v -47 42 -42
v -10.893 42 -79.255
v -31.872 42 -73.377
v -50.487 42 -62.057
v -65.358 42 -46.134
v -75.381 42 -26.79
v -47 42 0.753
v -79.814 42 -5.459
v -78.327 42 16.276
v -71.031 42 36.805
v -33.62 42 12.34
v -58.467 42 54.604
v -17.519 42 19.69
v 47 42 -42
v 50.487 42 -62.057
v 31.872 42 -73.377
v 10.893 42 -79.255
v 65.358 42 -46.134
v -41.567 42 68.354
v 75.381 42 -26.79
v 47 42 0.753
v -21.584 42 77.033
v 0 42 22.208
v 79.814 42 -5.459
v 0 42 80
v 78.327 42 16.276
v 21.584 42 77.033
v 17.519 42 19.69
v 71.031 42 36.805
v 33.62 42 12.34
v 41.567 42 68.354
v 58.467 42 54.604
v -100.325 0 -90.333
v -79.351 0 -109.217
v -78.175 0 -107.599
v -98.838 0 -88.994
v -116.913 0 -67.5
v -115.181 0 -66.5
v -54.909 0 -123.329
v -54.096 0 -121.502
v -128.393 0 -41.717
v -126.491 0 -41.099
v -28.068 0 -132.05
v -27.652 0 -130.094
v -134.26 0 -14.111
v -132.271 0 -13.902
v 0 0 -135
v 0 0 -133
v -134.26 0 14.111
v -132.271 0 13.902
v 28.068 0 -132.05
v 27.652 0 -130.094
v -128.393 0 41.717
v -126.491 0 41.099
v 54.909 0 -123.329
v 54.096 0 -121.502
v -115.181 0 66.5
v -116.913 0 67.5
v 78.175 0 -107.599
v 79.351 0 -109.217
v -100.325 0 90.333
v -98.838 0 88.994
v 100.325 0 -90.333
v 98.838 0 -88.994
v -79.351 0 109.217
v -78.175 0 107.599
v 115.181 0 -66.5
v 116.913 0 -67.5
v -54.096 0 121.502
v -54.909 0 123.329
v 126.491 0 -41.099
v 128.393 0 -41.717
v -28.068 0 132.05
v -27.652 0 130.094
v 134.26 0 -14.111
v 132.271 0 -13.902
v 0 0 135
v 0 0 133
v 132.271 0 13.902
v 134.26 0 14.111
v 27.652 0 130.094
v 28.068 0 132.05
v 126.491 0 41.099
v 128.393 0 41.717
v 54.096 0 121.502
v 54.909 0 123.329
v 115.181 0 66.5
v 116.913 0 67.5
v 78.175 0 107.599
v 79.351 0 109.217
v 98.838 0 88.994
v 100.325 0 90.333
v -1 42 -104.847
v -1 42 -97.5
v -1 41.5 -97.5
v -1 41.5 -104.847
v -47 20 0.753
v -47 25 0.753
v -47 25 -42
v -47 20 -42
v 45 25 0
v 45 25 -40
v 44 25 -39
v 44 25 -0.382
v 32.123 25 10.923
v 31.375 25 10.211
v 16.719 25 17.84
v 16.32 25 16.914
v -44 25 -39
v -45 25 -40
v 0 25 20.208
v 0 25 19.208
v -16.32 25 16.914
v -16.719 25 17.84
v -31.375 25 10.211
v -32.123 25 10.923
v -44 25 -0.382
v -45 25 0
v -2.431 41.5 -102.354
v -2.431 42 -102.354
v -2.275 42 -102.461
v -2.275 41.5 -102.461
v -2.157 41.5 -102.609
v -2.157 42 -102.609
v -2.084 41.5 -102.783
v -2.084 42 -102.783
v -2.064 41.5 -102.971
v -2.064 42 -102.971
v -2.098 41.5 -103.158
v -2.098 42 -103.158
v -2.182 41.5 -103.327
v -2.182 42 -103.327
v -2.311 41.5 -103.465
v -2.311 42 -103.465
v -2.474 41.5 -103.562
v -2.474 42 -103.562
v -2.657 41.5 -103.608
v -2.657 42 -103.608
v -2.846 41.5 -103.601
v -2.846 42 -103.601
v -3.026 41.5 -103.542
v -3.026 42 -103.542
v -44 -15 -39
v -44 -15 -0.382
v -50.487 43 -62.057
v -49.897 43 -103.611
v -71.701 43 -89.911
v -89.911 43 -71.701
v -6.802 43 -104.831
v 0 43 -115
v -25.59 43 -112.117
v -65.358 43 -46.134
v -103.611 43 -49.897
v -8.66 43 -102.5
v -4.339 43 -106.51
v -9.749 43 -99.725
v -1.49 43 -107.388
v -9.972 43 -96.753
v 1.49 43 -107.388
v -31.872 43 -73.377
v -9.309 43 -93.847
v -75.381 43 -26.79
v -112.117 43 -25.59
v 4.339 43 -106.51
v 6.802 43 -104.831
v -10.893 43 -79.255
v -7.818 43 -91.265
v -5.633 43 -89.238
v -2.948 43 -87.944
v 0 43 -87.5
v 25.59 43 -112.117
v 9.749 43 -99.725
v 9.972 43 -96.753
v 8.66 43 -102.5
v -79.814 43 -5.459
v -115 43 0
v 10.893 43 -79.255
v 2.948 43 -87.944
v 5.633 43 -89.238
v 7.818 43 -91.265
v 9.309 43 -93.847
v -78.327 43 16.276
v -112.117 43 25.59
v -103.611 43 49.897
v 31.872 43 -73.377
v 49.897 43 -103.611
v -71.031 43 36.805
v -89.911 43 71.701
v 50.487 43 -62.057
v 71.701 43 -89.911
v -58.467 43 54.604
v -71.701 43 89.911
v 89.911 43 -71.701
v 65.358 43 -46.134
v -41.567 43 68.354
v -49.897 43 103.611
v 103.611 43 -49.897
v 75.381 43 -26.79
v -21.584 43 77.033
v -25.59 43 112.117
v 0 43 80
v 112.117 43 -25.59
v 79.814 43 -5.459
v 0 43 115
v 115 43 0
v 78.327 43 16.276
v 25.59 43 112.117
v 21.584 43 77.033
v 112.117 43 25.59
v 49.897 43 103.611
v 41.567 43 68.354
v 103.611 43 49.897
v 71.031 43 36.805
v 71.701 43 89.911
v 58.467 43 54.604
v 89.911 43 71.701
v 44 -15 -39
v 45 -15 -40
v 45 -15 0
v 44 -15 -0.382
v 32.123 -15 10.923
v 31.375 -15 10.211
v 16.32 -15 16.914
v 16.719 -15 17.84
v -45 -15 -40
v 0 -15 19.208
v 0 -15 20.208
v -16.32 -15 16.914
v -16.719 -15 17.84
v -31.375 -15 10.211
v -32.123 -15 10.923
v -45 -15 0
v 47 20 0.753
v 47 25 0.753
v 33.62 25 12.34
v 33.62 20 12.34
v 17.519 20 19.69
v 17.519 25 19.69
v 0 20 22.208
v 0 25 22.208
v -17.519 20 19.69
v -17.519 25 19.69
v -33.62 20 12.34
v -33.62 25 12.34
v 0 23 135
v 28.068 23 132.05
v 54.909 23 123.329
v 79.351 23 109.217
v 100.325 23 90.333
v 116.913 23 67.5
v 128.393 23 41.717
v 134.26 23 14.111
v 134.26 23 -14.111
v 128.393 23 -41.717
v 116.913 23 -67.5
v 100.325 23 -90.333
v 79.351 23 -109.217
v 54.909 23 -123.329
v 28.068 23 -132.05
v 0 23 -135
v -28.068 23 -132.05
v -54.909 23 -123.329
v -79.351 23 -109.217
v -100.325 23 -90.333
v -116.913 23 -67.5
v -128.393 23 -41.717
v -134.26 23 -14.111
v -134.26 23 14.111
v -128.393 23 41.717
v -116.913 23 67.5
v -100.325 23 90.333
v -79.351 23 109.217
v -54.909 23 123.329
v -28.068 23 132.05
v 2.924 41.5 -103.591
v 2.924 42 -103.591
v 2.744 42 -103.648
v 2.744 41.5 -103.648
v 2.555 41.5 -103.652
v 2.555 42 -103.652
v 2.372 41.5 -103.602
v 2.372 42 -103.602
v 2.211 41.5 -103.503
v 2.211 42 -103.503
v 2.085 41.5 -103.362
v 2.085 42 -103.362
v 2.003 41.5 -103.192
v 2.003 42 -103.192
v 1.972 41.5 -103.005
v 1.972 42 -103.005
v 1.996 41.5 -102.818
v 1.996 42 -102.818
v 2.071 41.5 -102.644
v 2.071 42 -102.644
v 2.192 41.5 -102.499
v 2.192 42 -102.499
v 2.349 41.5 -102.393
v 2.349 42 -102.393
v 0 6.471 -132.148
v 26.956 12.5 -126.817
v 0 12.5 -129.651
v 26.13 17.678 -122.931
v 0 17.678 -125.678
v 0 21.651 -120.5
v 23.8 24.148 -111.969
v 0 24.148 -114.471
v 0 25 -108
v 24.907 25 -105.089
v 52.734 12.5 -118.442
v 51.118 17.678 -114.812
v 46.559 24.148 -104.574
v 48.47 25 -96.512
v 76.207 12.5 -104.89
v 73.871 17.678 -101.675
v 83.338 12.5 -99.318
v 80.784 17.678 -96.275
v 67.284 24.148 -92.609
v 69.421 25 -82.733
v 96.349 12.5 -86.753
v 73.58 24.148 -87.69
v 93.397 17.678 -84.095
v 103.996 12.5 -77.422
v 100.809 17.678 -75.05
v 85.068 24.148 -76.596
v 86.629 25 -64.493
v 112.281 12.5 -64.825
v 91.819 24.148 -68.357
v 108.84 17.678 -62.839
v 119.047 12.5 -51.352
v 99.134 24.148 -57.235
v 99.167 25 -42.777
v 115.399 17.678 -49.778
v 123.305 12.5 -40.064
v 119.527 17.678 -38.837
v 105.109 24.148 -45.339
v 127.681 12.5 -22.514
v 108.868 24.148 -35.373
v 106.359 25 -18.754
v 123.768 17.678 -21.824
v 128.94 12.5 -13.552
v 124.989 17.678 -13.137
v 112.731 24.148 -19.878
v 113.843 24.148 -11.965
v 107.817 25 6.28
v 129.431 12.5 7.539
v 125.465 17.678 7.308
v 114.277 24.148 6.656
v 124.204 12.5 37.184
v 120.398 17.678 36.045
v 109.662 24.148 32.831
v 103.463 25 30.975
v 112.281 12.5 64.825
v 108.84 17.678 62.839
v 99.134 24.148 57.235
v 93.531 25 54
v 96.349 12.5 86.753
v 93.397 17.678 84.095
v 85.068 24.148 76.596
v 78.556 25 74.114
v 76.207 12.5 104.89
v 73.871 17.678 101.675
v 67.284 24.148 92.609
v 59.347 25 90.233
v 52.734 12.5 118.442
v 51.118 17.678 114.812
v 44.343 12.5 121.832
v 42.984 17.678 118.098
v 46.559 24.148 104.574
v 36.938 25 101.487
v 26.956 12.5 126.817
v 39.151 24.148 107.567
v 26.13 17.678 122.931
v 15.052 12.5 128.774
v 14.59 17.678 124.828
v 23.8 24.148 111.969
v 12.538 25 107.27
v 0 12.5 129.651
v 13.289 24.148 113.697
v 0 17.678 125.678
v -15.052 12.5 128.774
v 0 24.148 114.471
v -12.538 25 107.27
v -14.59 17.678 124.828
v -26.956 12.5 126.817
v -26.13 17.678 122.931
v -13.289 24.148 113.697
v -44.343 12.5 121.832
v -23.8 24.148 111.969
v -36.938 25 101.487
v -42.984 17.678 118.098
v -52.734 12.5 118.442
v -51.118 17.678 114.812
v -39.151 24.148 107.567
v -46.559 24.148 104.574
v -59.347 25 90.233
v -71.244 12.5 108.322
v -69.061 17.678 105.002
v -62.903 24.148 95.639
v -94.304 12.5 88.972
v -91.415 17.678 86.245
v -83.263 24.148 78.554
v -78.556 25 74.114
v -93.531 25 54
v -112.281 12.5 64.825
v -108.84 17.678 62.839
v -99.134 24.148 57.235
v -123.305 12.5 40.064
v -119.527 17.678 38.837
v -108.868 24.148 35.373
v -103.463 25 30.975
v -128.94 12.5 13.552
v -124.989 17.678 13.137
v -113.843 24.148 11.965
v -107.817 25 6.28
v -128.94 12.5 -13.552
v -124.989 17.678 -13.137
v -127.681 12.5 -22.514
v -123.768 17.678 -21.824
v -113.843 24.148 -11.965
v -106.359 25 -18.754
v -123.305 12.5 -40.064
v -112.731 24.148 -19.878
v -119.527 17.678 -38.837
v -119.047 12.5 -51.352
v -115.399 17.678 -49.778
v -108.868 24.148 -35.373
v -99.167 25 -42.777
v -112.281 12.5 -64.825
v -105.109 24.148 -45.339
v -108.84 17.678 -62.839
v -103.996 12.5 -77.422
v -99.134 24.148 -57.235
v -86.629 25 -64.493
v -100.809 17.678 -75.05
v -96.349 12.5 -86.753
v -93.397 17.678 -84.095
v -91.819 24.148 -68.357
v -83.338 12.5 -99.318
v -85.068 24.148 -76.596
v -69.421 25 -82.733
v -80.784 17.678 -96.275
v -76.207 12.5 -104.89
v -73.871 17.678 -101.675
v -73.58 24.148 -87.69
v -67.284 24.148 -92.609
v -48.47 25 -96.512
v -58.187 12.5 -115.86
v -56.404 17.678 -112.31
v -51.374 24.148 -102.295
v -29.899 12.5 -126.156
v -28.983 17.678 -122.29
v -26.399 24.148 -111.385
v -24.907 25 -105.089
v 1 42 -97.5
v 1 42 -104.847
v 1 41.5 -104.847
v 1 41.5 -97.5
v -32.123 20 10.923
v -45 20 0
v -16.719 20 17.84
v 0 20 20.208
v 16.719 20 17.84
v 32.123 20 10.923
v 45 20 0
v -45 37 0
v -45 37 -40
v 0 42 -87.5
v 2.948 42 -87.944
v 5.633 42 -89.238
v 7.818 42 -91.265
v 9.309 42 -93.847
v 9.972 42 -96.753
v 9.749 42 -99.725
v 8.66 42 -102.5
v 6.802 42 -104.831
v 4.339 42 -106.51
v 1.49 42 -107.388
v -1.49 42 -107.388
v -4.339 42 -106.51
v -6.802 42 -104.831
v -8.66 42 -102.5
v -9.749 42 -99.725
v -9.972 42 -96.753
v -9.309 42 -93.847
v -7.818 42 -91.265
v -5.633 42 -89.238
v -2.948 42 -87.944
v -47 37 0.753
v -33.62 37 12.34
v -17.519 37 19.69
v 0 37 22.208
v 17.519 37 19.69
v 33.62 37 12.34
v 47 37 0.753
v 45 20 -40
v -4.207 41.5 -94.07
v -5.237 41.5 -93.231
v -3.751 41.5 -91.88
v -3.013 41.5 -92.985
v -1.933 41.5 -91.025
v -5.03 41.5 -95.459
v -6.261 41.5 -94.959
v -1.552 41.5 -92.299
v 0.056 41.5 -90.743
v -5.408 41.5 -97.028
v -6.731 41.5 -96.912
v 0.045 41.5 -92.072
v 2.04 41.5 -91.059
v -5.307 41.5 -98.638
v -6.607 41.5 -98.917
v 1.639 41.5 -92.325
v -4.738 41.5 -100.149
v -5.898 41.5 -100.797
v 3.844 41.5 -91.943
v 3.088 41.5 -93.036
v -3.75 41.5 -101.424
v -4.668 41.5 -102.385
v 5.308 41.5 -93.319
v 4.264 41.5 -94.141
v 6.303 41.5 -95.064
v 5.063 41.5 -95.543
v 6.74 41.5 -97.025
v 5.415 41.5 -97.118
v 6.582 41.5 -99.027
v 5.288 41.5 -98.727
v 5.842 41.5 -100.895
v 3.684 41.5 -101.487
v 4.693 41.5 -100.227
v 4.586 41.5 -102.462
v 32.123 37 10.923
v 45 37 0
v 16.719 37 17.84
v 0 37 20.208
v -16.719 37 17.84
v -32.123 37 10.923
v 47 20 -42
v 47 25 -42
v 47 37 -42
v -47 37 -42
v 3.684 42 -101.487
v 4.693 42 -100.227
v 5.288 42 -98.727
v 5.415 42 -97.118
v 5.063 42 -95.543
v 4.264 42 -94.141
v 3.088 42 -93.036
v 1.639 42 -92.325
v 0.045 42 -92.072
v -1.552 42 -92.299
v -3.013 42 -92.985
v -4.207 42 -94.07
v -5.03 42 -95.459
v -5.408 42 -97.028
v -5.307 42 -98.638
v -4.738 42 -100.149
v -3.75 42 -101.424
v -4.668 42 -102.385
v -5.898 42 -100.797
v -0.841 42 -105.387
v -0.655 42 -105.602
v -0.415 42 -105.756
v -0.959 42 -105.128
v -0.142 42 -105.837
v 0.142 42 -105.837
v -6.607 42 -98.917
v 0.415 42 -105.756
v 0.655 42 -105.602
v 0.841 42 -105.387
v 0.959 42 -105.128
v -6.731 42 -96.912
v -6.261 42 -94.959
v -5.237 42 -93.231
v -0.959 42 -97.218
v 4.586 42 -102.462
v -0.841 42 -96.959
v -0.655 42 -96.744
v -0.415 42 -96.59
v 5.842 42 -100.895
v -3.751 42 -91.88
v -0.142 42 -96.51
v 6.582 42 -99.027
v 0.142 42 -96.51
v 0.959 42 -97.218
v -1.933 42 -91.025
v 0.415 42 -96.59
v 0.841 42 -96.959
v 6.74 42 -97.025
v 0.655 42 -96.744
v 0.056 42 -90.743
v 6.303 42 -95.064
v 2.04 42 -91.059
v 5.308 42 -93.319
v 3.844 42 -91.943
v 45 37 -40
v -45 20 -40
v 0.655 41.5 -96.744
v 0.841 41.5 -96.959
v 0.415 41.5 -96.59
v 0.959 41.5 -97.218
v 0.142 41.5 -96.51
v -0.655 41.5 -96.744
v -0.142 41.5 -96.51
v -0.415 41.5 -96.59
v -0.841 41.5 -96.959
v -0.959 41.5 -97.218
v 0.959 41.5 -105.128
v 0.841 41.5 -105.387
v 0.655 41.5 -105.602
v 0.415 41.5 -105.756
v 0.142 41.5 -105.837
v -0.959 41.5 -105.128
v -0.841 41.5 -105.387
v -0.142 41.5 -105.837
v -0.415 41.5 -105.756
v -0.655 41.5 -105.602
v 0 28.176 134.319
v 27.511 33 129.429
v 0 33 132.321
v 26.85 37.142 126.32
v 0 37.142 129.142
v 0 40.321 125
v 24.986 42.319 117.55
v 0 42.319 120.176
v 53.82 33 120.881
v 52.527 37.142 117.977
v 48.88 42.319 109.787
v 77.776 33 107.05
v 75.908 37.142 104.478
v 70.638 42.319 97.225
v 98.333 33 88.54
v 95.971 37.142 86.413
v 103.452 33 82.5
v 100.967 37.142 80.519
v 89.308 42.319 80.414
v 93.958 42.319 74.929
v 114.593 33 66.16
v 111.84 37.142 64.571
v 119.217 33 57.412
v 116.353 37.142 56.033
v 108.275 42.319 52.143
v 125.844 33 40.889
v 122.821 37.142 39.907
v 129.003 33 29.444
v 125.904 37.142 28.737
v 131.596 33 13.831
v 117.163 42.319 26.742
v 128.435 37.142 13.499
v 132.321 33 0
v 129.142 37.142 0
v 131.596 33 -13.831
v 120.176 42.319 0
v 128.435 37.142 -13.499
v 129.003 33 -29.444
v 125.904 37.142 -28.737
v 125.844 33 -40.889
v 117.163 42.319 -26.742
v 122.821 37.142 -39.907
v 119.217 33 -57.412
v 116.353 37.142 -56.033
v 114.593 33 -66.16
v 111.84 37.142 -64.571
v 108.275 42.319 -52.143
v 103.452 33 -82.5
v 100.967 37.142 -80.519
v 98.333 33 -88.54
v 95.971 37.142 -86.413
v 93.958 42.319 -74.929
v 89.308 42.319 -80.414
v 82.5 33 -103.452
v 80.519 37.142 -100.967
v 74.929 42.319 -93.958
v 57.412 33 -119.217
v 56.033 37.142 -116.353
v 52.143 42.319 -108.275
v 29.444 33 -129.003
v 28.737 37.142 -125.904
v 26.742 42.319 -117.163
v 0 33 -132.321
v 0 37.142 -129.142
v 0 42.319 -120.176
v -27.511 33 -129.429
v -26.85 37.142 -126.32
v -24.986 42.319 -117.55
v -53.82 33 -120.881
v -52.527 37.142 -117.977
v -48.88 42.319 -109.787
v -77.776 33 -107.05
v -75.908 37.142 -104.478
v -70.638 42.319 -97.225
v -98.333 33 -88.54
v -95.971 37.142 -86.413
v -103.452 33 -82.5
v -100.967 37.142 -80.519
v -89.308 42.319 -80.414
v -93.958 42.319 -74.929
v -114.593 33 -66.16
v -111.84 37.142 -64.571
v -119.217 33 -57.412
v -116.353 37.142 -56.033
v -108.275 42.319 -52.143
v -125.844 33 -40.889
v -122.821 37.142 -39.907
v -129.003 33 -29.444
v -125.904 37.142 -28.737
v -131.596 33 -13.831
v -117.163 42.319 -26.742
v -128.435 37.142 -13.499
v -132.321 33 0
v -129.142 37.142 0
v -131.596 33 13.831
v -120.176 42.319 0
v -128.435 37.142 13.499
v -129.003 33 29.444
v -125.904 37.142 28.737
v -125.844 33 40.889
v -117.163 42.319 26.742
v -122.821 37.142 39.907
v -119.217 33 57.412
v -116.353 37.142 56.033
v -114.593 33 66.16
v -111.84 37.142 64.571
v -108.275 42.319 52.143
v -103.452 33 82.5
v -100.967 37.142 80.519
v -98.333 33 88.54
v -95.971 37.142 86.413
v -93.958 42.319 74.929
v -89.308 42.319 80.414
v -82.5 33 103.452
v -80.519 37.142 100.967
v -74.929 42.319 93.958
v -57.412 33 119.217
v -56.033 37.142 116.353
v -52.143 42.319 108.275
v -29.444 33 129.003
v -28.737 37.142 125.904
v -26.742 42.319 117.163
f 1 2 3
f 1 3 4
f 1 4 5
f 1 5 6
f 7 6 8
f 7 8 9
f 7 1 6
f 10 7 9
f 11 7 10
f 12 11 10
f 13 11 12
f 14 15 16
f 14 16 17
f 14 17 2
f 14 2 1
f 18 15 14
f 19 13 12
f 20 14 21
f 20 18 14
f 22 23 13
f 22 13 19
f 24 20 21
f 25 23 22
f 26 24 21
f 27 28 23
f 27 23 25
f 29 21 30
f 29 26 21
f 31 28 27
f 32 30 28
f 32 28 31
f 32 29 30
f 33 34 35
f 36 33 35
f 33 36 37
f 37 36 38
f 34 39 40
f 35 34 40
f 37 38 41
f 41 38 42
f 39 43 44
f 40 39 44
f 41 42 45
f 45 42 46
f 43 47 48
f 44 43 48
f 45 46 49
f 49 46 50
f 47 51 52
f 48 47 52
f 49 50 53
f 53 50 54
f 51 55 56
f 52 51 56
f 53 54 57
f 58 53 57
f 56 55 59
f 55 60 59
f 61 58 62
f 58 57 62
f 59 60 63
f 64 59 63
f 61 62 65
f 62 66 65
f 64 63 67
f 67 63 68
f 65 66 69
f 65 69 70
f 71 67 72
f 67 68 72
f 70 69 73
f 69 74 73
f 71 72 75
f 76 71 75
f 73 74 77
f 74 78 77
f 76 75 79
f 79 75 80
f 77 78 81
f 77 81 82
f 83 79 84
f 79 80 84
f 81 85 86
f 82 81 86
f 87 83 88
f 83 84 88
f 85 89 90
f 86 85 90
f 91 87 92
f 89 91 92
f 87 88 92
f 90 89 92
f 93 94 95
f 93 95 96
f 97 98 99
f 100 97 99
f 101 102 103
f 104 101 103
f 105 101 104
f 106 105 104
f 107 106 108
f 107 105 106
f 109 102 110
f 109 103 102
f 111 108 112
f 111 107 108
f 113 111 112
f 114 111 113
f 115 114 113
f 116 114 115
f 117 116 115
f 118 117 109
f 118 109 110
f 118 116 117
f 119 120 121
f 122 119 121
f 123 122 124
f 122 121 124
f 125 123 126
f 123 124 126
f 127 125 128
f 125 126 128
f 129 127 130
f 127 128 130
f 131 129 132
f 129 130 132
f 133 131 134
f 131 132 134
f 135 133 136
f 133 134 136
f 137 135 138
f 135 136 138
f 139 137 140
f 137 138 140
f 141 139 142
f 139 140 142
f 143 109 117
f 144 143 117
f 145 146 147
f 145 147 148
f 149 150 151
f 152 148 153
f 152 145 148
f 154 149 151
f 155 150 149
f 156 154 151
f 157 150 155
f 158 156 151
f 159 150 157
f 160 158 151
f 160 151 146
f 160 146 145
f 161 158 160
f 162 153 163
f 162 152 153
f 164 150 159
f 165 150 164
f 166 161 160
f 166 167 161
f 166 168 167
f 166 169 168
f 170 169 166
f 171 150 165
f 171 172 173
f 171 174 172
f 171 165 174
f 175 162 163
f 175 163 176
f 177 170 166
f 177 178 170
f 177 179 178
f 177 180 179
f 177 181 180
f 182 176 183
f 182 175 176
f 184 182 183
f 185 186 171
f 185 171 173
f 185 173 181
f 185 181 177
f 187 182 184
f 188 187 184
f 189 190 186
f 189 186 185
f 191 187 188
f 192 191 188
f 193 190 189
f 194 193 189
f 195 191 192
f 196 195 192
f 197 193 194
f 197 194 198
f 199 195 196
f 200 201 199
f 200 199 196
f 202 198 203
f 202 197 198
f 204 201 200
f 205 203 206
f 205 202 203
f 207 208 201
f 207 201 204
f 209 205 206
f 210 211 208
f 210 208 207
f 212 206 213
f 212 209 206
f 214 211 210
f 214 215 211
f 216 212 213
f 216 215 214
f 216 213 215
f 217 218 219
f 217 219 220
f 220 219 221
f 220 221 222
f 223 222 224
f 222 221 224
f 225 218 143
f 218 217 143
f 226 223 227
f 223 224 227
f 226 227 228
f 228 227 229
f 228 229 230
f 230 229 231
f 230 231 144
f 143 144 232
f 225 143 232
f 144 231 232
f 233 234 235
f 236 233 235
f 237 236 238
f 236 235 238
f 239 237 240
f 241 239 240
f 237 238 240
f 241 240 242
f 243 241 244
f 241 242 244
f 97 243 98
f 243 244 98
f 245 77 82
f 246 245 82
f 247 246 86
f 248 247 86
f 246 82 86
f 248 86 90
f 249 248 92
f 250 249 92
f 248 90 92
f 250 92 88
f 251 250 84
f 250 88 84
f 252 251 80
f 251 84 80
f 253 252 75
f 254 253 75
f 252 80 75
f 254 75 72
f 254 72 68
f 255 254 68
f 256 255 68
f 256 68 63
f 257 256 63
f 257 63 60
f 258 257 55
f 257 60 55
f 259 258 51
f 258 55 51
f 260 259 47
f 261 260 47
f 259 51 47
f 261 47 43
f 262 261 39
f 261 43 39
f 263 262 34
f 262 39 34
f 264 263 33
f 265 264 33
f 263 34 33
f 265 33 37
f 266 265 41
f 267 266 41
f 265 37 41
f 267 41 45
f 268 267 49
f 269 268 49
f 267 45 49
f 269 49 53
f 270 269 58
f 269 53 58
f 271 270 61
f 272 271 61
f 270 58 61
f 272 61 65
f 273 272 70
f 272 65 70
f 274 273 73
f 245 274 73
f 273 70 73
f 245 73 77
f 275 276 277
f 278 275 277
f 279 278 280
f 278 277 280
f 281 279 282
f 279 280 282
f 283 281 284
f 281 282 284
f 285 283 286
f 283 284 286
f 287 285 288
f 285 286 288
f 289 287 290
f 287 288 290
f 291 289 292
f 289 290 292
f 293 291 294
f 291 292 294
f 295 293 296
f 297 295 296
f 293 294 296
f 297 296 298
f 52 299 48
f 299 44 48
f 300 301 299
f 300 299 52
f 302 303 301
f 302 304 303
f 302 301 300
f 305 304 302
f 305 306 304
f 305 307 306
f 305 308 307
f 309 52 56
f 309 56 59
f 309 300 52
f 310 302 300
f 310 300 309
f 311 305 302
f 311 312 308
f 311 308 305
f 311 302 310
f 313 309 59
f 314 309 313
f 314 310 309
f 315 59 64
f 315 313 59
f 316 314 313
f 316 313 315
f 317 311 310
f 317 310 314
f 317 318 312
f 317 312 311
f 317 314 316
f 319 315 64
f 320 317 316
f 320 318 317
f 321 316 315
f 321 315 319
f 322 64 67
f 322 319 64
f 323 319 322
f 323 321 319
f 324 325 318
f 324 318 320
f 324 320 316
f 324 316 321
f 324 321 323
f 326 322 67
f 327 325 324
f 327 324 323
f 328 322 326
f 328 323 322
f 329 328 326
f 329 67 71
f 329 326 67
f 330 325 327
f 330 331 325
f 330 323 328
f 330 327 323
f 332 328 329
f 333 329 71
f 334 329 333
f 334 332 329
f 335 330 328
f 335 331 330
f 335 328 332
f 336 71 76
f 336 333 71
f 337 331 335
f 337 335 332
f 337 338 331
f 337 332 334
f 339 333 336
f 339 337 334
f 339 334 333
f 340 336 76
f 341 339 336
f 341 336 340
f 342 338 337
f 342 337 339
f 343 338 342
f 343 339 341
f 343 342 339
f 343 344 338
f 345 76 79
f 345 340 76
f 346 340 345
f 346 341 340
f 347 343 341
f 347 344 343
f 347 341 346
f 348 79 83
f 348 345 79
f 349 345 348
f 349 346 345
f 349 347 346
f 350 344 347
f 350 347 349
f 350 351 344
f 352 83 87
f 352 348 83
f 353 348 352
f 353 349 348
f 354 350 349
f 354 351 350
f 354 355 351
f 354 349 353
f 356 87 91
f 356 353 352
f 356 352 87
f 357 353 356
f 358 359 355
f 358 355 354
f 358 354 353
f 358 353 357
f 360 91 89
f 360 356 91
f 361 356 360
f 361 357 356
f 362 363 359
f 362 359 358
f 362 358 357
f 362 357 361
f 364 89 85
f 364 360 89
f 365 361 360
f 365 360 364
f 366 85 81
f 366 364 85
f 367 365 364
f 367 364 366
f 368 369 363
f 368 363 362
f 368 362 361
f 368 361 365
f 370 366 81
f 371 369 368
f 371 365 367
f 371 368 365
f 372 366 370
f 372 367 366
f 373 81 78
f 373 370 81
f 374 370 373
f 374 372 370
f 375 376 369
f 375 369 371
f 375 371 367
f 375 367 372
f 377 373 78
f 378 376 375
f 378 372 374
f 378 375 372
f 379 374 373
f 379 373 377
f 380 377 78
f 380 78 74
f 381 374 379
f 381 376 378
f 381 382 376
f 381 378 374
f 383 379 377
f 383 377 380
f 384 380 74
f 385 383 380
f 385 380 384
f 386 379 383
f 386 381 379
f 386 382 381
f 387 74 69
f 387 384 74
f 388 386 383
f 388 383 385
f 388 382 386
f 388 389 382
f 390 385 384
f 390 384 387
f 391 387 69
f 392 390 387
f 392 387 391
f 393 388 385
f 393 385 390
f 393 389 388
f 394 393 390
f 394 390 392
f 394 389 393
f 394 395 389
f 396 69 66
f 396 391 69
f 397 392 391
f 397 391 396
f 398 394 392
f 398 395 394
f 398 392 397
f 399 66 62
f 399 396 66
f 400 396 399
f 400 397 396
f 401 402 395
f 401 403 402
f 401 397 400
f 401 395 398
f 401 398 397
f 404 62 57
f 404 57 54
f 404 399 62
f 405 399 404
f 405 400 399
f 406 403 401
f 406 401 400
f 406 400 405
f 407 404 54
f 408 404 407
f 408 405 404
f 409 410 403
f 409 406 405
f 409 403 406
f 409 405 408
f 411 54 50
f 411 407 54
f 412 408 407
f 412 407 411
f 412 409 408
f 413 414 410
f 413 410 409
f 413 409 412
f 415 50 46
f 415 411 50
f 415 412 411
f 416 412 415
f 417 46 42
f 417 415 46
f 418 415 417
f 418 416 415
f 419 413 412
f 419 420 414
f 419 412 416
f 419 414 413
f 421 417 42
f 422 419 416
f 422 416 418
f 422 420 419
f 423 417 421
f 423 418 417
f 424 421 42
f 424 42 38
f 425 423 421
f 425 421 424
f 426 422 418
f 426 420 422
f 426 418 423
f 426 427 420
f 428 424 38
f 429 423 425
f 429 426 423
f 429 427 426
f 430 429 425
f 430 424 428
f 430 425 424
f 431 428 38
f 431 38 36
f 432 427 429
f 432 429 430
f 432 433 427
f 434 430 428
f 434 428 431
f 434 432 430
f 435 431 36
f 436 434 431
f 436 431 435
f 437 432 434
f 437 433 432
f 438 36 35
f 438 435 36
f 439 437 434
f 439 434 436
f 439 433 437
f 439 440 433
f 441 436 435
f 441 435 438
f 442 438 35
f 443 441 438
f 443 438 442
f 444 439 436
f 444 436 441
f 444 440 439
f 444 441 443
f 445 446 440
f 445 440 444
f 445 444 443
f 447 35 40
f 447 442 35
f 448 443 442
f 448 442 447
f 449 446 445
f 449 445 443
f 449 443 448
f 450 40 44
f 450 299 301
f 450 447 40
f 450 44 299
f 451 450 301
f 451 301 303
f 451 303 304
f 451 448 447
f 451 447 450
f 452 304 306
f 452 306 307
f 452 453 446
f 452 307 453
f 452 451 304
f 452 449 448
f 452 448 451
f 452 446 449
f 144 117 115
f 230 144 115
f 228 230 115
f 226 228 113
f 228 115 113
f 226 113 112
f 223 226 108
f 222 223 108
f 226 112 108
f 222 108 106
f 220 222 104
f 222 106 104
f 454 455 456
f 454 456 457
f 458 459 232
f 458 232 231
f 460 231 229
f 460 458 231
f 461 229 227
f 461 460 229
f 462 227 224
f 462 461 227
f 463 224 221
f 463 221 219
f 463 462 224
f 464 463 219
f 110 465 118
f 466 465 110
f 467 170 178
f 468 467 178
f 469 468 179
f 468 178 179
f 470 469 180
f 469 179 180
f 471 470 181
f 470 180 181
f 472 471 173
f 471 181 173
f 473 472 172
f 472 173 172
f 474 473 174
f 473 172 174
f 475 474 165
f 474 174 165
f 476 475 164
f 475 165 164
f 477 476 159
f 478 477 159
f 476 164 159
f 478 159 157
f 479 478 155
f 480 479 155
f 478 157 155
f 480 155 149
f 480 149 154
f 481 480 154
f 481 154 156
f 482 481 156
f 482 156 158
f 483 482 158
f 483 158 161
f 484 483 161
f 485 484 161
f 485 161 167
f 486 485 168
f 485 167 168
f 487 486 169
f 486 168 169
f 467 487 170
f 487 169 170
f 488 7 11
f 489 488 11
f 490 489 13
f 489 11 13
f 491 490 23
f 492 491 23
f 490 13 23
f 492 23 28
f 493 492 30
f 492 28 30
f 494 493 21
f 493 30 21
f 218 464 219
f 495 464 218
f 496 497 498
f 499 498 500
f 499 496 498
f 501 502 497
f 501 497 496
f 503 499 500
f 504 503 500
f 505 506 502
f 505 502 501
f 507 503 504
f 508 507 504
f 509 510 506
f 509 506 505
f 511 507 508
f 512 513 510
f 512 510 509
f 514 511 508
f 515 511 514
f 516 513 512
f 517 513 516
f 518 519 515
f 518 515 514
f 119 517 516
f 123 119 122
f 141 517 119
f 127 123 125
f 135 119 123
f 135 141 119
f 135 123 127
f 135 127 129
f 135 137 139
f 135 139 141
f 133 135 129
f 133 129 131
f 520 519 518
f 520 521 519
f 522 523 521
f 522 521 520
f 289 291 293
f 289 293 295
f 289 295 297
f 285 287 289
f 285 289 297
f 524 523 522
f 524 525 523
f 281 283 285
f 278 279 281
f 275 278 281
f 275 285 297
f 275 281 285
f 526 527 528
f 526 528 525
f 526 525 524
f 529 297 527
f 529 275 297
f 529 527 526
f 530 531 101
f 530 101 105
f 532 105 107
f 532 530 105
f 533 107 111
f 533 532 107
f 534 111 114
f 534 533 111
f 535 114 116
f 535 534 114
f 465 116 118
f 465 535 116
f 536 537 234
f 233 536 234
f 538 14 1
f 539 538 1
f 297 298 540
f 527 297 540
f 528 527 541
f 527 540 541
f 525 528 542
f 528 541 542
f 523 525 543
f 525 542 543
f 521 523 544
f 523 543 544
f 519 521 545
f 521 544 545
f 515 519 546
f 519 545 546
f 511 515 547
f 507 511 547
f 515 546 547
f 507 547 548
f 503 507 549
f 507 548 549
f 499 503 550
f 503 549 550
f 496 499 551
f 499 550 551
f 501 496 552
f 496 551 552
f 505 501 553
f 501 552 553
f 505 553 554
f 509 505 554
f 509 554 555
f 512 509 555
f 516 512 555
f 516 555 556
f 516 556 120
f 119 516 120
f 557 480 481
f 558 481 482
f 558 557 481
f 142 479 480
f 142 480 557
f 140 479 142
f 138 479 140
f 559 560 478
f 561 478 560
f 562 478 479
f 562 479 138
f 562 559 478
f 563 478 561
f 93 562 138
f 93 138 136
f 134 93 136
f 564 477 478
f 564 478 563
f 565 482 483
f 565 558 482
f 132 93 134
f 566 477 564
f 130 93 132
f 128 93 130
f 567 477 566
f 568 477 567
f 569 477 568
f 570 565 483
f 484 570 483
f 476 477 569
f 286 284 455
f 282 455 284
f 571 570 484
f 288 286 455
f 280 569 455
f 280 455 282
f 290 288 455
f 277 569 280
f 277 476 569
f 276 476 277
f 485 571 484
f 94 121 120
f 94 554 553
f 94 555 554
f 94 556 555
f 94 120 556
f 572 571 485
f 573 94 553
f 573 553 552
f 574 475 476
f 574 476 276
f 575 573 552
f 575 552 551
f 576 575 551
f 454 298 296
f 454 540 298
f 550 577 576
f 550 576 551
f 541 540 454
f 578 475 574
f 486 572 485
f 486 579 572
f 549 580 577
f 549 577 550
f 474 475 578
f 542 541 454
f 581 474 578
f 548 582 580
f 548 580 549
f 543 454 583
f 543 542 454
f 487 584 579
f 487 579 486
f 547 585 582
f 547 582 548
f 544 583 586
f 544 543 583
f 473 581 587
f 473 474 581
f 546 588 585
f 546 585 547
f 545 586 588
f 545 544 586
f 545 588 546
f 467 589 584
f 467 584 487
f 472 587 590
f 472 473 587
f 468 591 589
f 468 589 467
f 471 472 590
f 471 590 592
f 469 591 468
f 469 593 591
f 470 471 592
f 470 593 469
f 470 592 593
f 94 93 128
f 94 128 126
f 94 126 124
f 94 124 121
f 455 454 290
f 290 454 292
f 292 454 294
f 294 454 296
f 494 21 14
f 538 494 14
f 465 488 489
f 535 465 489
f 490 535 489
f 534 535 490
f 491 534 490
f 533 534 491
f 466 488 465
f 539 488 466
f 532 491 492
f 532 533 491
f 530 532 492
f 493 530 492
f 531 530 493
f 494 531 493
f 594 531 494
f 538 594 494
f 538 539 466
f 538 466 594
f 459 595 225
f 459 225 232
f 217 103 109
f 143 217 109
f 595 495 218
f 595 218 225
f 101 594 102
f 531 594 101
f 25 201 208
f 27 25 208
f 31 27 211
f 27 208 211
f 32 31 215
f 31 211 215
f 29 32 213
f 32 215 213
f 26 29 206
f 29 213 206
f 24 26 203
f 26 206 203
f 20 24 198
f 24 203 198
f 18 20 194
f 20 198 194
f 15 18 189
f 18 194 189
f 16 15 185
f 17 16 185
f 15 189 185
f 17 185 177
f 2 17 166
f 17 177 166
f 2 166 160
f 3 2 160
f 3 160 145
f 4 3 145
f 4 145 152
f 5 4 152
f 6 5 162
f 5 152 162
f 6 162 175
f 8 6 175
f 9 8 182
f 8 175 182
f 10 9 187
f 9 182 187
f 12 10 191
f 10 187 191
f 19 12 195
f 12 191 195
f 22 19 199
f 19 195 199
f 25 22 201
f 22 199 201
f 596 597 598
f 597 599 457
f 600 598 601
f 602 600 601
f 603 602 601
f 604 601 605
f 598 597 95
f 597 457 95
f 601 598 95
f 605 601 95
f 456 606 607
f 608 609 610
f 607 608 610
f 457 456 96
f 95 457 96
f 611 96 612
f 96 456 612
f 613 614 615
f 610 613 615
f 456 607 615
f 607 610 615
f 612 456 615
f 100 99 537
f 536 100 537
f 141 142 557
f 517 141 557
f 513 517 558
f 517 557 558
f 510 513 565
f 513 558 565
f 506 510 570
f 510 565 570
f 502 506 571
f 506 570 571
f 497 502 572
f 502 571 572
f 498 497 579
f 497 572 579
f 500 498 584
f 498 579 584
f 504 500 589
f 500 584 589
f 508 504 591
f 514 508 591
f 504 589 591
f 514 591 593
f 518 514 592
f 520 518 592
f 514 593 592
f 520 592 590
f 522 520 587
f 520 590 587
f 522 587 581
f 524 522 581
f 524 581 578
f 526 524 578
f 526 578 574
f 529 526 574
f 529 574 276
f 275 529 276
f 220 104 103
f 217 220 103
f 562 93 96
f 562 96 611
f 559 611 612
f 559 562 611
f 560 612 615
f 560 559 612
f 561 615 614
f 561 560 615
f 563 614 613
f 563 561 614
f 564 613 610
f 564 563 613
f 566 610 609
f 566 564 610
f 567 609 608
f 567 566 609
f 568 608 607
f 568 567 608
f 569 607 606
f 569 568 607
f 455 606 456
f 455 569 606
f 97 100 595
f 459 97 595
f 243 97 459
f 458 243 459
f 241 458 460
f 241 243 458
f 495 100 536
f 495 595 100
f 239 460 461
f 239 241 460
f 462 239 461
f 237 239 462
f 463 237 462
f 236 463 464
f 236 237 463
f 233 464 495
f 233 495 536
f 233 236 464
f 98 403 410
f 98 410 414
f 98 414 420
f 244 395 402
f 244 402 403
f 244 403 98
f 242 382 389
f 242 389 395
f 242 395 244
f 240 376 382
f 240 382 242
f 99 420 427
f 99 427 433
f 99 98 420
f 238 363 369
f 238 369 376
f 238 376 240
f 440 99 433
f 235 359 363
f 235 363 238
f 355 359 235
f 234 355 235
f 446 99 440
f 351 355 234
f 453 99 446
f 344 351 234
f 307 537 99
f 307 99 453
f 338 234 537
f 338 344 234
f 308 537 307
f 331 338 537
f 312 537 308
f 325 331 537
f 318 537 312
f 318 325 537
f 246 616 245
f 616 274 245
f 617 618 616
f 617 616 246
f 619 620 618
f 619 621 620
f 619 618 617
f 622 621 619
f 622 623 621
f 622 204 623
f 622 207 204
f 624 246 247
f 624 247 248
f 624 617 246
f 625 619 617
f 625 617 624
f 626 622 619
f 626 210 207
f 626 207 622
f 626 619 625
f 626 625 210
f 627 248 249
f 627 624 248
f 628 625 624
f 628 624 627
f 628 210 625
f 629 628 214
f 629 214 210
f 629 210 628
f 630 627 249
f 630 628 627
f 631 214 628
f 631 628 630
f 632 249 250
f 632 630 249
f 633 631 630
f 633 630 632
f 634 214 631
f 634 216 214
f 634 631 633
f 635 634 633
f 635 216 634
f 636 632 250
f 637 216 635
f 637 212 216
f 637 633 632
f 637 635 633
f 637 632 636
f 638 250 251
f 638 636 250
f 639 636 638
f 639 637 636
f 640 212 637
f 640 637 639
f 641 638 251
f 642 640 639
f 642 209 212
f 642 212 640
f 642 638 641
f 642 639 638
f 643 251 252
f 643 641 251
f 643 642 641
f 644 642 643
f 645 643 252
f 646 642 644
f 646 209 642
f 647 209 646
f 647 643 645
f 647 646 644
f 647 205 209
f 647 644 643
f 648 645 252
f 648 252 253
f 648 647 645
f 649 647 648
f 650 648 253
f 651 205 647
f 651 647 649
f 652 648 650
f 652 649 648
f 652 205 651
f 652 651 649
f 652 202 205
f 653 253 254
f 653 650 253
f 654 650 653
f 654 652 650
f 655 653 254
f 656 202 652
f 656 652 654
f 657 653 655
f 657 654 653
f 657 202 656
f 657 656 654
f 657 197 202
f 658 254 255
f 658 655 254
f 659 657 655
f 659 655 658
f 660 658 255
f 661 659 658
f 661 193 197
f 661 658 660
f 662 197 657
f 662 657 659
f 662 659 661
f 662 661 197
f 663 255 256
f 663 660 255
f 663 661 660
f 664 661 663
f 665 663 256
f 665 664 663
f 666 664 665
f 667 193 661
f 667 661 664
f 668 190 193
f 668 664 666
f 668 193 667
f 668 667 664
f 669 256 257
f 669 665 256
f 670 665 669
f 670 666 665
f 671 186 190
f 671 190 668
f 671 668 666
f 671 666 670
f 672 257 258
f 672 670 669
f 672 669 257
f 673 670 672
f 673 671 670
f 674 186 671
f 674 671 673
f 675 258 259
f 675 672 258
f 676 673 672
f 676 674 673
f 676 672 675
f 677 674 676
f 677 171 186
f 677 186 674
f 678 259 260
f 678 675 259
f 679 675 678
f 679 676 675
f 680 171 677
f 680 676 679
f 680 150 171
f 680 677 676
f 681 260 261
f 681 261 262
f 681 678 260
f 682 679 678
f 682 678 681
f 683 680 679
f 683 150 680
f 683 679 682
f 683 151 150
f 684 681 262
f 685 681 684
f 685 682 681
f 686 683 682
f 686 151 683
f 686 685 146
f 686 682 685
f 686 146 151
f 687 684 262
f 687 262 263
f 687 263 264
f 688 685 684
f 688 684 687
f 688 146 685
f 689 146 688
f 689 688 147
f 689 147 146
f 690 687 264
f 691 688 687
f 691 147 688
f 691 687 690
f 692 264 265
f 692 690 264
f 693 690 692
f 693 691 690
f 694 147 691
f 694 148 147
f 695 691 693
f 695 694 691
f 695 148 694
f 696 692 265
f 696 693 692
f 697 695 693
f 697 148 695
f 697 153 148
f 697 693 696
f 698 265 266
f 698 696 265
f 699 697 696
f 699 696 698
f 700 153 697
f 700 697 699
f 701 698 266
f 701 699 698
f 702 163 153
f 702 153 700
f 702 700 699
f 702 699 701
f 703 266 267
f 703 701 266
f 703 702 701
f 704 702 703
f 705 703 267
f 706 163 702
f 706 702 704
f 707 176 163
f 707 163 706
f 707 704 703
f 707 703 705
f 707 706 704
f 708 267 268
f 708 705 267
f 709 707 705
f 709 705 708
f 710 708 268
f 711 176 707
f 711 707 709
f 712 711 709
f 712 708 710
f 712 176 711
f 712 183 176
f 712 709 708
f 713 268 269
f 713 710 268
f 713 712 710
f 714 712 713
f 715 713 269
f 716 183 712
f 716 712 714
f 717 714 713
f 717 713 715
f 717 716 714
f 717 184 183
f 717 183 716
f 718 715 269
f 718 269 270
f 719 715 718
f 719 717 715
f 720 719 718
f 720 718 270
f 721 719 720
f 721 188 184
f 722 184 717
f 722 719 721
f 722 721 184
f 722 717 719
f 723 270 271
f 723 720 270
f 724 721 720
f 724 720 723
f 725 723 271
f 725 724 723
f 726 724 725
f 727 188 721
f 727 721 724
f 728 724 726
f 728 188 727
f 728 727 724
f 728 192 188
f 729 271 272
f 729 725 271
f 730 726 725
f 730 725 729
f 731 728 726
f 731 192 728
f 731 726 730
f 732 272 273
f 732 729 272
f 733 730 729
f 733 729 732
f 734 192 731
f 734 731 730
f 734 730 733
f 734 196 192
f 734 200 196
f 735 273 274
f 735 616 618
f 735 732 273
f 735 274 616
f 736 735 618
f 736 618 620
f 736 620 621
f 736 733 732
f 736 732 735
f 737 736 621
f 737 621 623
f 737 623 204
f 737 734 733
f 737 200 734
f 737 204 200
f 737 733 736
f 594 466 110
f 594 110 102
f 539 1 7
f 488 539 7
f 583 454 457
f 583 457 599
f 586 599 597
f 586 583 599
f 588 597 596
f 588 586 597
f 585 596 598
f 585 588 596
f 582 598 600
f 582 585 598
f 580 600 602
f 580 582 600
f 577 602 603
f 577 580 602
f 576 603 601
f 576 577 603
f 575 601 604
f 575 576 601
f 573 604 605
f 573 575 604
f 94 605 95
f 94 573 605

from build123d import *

# Parameters (mm, degrees)
CROQUIS1_R              = 135
SALIENTE_EXTRUIR1_DEPTH = 43
REDONDEO5_R             = 20
CROQUIS2_R              = 133
CORTAR_EXTRUIR6_DEPTH   = 25
REDONDEO6_R             = 25
CROQUIS4_R              = 80
CORTAR_EXTRUIR7_DEPTH   = 1
CORTAR_EXTRUIR8_DEPTH   = 67
CROQUIS6_R              = 10
CORTAR_EXTRUIR9_DEPTH   = 1
CORTAR_EXTRUIR10_DEPTH  = 0.5
SALIENTE_EXTRUIR3_DEPTH = 40
SALIENTE_EXTRUIR4_DEPTH = 5
CORTAR_EXTRUIR11_DEPTH  = 5


with BuildPart() as part:
    # Croquis1 → Saliente-Extruir1 (new body)
    with BuildSketch(Plane(origin=(0, 0, 0), x_dir=(1, 0, 0), z_dir=(0, 1, 0))):
        with Locations(Location((0, 0, 0), (0, 0, 270))):
            Circle(CROQUIS1_R)
    extrude(amount=SALIENTE_EXTRUIR1_DEPTH)

    # Redondeo5
    redondeo5_edges = [part.edges().sort_by_distance(p)[0] for p in [
        (0, 43, -135),
    ]]
    fillet(redondeo5_edges, radius=REDONDEO5_R)

    # Croquis2 → Cortar-Extruir6 (cut)
    with BuildSketch(Plane(origin=(0, 0, 0), x_dir=(-1, 0, 0), z_dir=(0, -1, 0))):
        with Locations(Location((0, 0, 0), (0, 0, 90))):
            Circle(CROQUIS2_R)
    extrude(amount=-CORTAR_EXTRUIR6_DEPTH, mode=Mode.SUBTRACT)

    # Redondeo6
    redondeo6_edges = [part.edges().sort_by_distance(p)[0] for p in [
        (0, 25, 133),
    ]]
    fillet(redondeo6_edges, radius=REDONDEO6_R - 0.0001)  # a hair under: the kernel refuses the full size

    # Croquis4 → Cortar-Extruir7 (cut)
    with BuildSketch(Plane(origin=(0, 43, 0), x_dir=(1, 0, 0), z_dir=(0, 1, 0))):
        with Locations(Location((0, 0, 0), (0, 0, 270))):
            Circle(CROQUIS4_R)
    extrude(amount=-CORTAR_EXTRUIR7_DEPTH, mode=Mode.SUBTRACT)

    # Croquis5 → Cortar-Extruir8 (cut)
    with BuildSketch(Plane(origin=(0, 42, 0), x_dir=(1, 0, 0), z_dir=(0, 1, 0))):
        with BuildLine():
            Line((-45, 0), (-45, 40))
            Line((-45, 40), (45, 40))
            Line((45, 40), (45, 0))
            ThreePointArc((45, 0), (0, -20.207972894), (-45, 0))
        make_face()
    extrude(amount=-CORTAR_EXTRUIR8_DEPTH, mode=Mode.SUBTRACT)

    # Croquis6 → Cortar-Extruir9 (cut)
    with BuildSketch(Plane(origin=(0, 43, 0), x_dir=(1, 0, 0), z_dir=(0, 1, 0))):
        with Locations(Location((0, 97.5, 0), (0, 0, 270))):
            Circle(CROQUIS6_R)
    extrude(amount=-CORTAR_EXTRUIR9_DEPTH, mode=Mode.SUBTRACT)

    # Croquis7 → Cortar-Extruir10 (cut)
    with BuildSketch(Plane(origin=(0, 42, 0), x_dir=(1, 0, 0), z_dir=(0, 1, 0))):
        with BuildLine():
            Line((-1, 97.5), (-1, 104.846686009))
            ThreePointArc((-1, 104.846686009), (0, 105.846686009), (1, 104.846686009))
            Line((1, 104.846686009), (1, 97.5))
            ThreePointArc((1, 97.5), (0, 96.5), (-1, 97.5))
        make_face()
        with BuildLine():
            ThreePointArc((-3.025522609, 103.54170716), (0.056423139, 90.743312284), (2.924202621, 103.591391589))
            ThreePointArc((2.924202621, 103.591391589), (2.037712876, 103.279966687), (2.349137778, 102.393476942))
            ThreePointArc((2.349137778, 102.393476942), (0.045327135, 92.072062056), (-2.430532483, 102.353563302))
            ThreePointArc((-2.430532483, 102.353563302), (-2.133955617, 103.245130294), (-3.025522609, 103.54170716))
        make_face()
    extrude(amount=-CORTAR_EXTRUIR10_DEPTH, mode=Mode.SUBTRACT)



with BuildPart() as body_2:
    # Croquis9 → Saliente-Extruir3 (new body)
    with BuildSketch(Plane.XZ.offset(-25)):
        with BuildLine():
            Line((45, -40), (-45, -40))
            Line((-45, -40), (-45, 0))
            ThreePointArc((-45, 0), (0, 20.207972894), (45, 0))
            Line((45, 0), (45, -40))
        make_face()
        with BuildLine():
            Line((44, -39), (-44, -39))
            Line((-44, -39), (-44, -0.382023598))
            ThreePointArc((-44, -0.382023598), (0, 19.207972894), (44, -0.382023598))
            Line((44, -0.382023598), (44, -39))
        make_face(mode=Mode.SUBTRACT)
    extrude(amount=SALIENTE_EXTRUIR3_DEPTH)


with BuildPart() as part_1:
    add(part.part)

    add(body_2.part)  # Saliente-Extruir4 merges body 2
    # Croquis11 → Saliente-Extruir4 (add)
    with BuildSketch(Plane.XZ.offset(-25)):
        with BuildLine():
            Line((47, -42), (47, 0.753305284))
            ThreePointArc((47, 0.753305284), (0, 22.207972894), (-47, 0.753305284))
            Line((-47, 0.753305284), (-47, -42))
            Line((-47, -42), (47, -42))
        make_face()
        with BuildLine():
            Line((45, 0), (45, -40))
            Line((45, -40), (-45, -40))
            Line((-45, -40), (-45, 0))
            ThreePointArc((-45, 0), (0, 20.207972894), (45, 0))
        make_face(mode=Mode.SUBTRACT)
    extrude(amount=SALIENTE_EXTRUIR4_DEPTH)

    # Croquis12 → Cortar-Extruir11 (cut)
    with BuildSketch(Plane(origin=(0, 42, 0), x_dir=(1, 0, 0), z_dir=(0, 1, 0))):
        with BuildLine():
            Line((47, -0.753305284), (47, 42))
            Line((47, 42), (-47, 42))
            Line((-47, 42), (-47, -0.753305284))
            ThreePointArc((-47, -0.753305284), (0, -22.207972894), (47, -0.753305284))
        make_face()
        with BuildLine():
            Line((45, 40), (-45, 40))
            Line((-45, 40), (-45, 0))
            ThreePointArc((-45, 0), (0, -20.207972894), (45, 0))
            Line((45, 0), (45, 40))
        make_face(mode=Mode.SUBTRACT)
    extrude(amount=-CORTAR_EXTRUIR11_DEPTH, mode=Mode.SUBTRACT)


solid = part_1.part
